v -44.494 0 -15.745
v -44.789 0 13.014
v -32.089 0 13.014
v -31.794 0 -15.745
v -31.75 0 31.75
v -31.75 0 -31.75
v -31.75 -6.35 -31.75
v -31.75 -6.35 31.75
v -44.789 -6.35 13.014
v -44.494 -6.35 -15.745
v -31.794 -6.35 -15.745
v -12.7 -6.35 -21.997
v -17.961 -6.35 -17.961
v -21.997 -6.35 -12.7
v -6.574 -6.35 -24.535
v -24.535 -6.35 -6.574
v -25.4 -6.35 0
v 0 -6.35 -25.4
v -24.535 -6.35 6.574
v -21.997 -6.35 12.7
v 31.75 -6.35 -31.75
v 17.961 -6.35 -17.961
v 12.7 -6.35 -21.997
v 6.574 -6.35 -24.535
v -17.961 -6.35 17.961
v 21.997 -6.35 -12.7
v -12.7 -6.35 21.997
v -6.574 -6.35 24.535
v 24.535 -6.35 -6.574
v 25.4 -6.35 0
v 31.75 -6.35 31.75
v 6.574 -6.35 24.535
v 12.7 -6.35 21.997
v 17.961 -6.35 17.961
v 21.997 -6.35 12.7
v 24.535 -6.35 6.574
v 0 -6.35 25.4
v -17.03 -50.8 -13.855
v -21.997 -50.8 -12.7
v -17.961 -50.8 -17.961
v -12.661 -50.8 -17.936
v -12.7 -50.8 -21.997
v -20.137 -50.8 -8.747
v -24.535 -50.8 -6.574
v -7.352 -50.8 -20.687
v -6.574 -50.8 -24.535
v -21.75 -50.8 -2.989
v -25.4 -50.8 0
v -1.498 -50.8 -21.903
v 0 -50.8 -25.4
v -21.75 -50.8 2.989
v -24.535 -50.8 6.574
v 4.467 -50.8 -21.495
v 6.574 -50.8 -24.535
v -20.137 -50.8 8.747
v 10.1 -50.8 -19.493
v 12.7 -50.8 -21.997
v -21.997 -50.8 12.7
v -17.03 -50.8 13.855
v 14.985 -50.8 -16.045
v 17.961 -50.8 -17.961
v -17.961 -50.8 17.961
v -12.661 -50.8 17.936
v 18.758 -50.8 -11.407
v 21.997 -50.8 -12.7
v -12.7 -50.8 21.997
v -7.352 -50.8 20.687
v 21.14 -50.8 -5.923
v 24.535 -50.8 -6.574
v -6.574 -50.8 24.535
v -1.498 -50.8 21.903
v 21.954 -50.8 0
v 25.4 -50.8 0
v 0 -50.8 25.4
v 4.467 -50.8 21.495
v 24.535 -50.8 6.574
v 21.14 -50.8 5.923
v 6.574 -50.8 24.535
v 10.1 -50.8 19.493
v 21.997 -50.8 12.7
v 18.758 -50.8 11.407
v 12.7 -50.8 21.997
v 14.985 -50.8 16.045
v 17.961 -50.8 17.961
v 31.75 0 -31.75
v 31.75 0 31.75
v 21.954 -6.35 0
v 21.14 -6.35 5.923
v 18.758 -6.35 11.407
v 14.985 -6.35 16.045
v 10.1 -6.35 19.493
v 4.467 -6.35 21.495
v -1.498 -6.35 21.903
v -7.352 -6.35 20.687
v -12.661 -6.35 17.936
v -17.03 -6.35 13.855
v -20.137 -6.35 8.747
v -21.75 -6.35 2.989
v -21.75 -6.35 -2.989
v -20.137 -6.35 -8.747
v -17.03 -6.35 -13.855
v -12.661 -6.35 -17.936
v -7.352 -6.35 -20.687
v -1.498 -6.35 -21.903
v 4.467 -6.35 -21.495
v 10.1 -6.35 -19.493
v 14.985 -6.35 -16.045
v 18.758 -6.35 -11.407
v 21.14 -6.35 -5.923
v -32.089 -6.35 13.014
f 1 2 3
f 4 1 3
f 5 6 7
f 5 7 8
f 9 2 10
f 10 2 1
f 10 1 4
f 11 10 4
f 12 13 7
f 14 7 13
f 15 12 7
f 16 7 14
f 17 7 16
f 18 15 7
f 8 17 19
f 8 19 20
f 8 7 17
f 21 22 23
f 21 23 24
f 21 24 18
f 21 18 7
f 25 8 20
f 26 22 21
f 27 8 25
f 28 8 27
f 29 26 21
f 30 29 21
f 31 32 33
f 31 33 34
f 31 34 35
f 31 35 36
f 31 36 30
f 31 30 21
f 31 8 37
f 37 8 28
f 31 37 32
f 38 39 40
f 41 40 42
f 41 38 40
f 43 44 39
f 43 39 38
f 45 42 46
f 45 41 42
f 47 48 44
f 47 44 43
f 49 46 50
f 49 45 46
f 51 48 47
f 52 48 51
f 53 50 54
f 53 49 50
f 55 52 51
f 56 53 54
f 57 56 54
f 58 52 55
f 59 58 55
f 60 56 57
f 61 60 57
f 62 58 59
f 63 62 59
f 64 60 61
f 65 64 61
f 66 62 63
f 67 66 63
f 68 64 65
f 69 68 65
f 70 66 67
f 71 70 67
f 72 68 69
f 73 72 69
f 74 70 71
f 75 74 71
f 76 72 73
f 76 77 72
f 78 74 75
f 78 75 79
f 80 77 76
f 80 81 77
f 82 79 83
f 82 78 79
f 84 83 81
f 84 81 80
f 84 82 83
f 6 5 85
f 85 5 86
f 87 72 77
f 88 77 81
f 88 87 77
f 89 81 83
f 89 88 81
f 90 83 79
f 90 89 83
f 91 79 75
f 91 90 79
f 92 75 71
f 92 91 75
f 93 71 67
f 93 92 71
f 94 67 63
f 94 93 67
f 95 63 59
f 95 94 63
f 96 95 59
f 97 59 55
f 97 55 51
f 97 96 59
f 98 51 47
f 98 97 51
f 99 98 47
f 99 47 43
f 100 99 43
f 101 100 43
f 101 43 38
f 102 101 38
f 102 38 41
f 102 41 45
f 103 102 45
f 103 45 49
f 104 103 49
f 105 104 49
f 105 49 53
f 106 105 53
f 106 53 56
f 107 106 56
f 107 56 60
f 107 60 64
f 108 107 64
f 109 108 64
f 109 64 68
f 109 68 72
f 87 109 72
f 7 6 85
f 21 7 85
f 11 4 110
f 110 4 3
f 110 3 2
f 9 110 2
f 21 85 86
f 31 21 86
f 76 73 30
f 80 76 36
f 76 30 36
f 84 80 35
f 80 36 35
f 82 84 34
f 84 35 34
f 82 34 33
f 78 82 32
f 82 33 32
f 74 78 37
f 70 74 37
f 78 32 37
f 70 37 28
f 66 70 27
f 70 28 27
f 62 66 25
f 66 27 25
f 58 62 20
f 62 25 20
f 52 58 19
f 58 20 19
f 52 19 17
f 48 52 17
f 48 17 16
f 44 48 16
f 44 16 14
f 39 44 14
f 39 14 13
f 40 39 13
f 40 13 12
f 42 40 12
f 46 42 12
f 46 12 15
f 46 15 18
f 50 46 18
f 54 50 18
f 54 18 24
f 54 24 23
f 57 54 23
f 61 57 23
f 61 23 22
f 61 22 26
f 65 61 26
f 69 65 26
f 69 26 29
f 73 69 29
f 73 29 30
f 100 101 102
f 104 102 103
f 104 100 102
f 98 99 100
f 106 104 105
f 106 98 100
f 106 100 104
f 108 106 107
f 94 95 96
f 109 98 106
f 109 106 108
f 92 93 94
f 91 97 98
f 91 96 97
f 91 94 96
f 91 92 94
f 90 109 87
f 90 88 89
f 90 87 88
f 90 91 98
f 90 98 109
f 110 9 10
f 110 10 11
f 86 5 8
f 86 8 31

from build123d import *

# Parameters (mm, degrees)
F0_R     = 25.4
F0_R_2   = 21.9544919018
F1_DEPTH = 50.8
F2_DEPTH = 114
F3_W     = 63.5
F3_H     = 63.5
F4_DEPTH = 6.35
F6_DEPTH = 6.35


# Not quite as in the source:
# - an extrude ends at something that could not be found from the text; its depth is read off the source's solid


with BuildPart() as f1:
    # F0 (on Front) → F1 (new body)
    with BuildSketch(Plane.XZ):
        Circle(F0_R)
        Circle(F0_R_2, mode=Mode.SUBTRACT)
    extrude(amount=F1_DEPTH)

    # F0 (on Front) → F2 (cut, through all)
    with BuildSketch(Plane.XZ):
        Circle(F0_R_2)
    extrude(amount=-F2_DEPTH, mode=Mode.SUBTRACT)

    # F3 (on Front) → F4 (join)
    with BuildSketch(Plane.XZ):
        Rectangle(F3_W, F3_H)
    extrude(amount=F4_DEPTH)


with BuildPart() as f6:
    # F5 (on Front) → F6 (new body)
    with BuildSketch(Plane.XZ):
        Polygon((-31.7943245173, -15.7453678548), (-32.0894233882, 13.013583608), (-44.7894233882, 13.013583608), (-44.4943245173, -15.7453678548), align=None)
    extrude(amount=F6_DEPTH)


solid = Compound([f1.part, f6.part])
